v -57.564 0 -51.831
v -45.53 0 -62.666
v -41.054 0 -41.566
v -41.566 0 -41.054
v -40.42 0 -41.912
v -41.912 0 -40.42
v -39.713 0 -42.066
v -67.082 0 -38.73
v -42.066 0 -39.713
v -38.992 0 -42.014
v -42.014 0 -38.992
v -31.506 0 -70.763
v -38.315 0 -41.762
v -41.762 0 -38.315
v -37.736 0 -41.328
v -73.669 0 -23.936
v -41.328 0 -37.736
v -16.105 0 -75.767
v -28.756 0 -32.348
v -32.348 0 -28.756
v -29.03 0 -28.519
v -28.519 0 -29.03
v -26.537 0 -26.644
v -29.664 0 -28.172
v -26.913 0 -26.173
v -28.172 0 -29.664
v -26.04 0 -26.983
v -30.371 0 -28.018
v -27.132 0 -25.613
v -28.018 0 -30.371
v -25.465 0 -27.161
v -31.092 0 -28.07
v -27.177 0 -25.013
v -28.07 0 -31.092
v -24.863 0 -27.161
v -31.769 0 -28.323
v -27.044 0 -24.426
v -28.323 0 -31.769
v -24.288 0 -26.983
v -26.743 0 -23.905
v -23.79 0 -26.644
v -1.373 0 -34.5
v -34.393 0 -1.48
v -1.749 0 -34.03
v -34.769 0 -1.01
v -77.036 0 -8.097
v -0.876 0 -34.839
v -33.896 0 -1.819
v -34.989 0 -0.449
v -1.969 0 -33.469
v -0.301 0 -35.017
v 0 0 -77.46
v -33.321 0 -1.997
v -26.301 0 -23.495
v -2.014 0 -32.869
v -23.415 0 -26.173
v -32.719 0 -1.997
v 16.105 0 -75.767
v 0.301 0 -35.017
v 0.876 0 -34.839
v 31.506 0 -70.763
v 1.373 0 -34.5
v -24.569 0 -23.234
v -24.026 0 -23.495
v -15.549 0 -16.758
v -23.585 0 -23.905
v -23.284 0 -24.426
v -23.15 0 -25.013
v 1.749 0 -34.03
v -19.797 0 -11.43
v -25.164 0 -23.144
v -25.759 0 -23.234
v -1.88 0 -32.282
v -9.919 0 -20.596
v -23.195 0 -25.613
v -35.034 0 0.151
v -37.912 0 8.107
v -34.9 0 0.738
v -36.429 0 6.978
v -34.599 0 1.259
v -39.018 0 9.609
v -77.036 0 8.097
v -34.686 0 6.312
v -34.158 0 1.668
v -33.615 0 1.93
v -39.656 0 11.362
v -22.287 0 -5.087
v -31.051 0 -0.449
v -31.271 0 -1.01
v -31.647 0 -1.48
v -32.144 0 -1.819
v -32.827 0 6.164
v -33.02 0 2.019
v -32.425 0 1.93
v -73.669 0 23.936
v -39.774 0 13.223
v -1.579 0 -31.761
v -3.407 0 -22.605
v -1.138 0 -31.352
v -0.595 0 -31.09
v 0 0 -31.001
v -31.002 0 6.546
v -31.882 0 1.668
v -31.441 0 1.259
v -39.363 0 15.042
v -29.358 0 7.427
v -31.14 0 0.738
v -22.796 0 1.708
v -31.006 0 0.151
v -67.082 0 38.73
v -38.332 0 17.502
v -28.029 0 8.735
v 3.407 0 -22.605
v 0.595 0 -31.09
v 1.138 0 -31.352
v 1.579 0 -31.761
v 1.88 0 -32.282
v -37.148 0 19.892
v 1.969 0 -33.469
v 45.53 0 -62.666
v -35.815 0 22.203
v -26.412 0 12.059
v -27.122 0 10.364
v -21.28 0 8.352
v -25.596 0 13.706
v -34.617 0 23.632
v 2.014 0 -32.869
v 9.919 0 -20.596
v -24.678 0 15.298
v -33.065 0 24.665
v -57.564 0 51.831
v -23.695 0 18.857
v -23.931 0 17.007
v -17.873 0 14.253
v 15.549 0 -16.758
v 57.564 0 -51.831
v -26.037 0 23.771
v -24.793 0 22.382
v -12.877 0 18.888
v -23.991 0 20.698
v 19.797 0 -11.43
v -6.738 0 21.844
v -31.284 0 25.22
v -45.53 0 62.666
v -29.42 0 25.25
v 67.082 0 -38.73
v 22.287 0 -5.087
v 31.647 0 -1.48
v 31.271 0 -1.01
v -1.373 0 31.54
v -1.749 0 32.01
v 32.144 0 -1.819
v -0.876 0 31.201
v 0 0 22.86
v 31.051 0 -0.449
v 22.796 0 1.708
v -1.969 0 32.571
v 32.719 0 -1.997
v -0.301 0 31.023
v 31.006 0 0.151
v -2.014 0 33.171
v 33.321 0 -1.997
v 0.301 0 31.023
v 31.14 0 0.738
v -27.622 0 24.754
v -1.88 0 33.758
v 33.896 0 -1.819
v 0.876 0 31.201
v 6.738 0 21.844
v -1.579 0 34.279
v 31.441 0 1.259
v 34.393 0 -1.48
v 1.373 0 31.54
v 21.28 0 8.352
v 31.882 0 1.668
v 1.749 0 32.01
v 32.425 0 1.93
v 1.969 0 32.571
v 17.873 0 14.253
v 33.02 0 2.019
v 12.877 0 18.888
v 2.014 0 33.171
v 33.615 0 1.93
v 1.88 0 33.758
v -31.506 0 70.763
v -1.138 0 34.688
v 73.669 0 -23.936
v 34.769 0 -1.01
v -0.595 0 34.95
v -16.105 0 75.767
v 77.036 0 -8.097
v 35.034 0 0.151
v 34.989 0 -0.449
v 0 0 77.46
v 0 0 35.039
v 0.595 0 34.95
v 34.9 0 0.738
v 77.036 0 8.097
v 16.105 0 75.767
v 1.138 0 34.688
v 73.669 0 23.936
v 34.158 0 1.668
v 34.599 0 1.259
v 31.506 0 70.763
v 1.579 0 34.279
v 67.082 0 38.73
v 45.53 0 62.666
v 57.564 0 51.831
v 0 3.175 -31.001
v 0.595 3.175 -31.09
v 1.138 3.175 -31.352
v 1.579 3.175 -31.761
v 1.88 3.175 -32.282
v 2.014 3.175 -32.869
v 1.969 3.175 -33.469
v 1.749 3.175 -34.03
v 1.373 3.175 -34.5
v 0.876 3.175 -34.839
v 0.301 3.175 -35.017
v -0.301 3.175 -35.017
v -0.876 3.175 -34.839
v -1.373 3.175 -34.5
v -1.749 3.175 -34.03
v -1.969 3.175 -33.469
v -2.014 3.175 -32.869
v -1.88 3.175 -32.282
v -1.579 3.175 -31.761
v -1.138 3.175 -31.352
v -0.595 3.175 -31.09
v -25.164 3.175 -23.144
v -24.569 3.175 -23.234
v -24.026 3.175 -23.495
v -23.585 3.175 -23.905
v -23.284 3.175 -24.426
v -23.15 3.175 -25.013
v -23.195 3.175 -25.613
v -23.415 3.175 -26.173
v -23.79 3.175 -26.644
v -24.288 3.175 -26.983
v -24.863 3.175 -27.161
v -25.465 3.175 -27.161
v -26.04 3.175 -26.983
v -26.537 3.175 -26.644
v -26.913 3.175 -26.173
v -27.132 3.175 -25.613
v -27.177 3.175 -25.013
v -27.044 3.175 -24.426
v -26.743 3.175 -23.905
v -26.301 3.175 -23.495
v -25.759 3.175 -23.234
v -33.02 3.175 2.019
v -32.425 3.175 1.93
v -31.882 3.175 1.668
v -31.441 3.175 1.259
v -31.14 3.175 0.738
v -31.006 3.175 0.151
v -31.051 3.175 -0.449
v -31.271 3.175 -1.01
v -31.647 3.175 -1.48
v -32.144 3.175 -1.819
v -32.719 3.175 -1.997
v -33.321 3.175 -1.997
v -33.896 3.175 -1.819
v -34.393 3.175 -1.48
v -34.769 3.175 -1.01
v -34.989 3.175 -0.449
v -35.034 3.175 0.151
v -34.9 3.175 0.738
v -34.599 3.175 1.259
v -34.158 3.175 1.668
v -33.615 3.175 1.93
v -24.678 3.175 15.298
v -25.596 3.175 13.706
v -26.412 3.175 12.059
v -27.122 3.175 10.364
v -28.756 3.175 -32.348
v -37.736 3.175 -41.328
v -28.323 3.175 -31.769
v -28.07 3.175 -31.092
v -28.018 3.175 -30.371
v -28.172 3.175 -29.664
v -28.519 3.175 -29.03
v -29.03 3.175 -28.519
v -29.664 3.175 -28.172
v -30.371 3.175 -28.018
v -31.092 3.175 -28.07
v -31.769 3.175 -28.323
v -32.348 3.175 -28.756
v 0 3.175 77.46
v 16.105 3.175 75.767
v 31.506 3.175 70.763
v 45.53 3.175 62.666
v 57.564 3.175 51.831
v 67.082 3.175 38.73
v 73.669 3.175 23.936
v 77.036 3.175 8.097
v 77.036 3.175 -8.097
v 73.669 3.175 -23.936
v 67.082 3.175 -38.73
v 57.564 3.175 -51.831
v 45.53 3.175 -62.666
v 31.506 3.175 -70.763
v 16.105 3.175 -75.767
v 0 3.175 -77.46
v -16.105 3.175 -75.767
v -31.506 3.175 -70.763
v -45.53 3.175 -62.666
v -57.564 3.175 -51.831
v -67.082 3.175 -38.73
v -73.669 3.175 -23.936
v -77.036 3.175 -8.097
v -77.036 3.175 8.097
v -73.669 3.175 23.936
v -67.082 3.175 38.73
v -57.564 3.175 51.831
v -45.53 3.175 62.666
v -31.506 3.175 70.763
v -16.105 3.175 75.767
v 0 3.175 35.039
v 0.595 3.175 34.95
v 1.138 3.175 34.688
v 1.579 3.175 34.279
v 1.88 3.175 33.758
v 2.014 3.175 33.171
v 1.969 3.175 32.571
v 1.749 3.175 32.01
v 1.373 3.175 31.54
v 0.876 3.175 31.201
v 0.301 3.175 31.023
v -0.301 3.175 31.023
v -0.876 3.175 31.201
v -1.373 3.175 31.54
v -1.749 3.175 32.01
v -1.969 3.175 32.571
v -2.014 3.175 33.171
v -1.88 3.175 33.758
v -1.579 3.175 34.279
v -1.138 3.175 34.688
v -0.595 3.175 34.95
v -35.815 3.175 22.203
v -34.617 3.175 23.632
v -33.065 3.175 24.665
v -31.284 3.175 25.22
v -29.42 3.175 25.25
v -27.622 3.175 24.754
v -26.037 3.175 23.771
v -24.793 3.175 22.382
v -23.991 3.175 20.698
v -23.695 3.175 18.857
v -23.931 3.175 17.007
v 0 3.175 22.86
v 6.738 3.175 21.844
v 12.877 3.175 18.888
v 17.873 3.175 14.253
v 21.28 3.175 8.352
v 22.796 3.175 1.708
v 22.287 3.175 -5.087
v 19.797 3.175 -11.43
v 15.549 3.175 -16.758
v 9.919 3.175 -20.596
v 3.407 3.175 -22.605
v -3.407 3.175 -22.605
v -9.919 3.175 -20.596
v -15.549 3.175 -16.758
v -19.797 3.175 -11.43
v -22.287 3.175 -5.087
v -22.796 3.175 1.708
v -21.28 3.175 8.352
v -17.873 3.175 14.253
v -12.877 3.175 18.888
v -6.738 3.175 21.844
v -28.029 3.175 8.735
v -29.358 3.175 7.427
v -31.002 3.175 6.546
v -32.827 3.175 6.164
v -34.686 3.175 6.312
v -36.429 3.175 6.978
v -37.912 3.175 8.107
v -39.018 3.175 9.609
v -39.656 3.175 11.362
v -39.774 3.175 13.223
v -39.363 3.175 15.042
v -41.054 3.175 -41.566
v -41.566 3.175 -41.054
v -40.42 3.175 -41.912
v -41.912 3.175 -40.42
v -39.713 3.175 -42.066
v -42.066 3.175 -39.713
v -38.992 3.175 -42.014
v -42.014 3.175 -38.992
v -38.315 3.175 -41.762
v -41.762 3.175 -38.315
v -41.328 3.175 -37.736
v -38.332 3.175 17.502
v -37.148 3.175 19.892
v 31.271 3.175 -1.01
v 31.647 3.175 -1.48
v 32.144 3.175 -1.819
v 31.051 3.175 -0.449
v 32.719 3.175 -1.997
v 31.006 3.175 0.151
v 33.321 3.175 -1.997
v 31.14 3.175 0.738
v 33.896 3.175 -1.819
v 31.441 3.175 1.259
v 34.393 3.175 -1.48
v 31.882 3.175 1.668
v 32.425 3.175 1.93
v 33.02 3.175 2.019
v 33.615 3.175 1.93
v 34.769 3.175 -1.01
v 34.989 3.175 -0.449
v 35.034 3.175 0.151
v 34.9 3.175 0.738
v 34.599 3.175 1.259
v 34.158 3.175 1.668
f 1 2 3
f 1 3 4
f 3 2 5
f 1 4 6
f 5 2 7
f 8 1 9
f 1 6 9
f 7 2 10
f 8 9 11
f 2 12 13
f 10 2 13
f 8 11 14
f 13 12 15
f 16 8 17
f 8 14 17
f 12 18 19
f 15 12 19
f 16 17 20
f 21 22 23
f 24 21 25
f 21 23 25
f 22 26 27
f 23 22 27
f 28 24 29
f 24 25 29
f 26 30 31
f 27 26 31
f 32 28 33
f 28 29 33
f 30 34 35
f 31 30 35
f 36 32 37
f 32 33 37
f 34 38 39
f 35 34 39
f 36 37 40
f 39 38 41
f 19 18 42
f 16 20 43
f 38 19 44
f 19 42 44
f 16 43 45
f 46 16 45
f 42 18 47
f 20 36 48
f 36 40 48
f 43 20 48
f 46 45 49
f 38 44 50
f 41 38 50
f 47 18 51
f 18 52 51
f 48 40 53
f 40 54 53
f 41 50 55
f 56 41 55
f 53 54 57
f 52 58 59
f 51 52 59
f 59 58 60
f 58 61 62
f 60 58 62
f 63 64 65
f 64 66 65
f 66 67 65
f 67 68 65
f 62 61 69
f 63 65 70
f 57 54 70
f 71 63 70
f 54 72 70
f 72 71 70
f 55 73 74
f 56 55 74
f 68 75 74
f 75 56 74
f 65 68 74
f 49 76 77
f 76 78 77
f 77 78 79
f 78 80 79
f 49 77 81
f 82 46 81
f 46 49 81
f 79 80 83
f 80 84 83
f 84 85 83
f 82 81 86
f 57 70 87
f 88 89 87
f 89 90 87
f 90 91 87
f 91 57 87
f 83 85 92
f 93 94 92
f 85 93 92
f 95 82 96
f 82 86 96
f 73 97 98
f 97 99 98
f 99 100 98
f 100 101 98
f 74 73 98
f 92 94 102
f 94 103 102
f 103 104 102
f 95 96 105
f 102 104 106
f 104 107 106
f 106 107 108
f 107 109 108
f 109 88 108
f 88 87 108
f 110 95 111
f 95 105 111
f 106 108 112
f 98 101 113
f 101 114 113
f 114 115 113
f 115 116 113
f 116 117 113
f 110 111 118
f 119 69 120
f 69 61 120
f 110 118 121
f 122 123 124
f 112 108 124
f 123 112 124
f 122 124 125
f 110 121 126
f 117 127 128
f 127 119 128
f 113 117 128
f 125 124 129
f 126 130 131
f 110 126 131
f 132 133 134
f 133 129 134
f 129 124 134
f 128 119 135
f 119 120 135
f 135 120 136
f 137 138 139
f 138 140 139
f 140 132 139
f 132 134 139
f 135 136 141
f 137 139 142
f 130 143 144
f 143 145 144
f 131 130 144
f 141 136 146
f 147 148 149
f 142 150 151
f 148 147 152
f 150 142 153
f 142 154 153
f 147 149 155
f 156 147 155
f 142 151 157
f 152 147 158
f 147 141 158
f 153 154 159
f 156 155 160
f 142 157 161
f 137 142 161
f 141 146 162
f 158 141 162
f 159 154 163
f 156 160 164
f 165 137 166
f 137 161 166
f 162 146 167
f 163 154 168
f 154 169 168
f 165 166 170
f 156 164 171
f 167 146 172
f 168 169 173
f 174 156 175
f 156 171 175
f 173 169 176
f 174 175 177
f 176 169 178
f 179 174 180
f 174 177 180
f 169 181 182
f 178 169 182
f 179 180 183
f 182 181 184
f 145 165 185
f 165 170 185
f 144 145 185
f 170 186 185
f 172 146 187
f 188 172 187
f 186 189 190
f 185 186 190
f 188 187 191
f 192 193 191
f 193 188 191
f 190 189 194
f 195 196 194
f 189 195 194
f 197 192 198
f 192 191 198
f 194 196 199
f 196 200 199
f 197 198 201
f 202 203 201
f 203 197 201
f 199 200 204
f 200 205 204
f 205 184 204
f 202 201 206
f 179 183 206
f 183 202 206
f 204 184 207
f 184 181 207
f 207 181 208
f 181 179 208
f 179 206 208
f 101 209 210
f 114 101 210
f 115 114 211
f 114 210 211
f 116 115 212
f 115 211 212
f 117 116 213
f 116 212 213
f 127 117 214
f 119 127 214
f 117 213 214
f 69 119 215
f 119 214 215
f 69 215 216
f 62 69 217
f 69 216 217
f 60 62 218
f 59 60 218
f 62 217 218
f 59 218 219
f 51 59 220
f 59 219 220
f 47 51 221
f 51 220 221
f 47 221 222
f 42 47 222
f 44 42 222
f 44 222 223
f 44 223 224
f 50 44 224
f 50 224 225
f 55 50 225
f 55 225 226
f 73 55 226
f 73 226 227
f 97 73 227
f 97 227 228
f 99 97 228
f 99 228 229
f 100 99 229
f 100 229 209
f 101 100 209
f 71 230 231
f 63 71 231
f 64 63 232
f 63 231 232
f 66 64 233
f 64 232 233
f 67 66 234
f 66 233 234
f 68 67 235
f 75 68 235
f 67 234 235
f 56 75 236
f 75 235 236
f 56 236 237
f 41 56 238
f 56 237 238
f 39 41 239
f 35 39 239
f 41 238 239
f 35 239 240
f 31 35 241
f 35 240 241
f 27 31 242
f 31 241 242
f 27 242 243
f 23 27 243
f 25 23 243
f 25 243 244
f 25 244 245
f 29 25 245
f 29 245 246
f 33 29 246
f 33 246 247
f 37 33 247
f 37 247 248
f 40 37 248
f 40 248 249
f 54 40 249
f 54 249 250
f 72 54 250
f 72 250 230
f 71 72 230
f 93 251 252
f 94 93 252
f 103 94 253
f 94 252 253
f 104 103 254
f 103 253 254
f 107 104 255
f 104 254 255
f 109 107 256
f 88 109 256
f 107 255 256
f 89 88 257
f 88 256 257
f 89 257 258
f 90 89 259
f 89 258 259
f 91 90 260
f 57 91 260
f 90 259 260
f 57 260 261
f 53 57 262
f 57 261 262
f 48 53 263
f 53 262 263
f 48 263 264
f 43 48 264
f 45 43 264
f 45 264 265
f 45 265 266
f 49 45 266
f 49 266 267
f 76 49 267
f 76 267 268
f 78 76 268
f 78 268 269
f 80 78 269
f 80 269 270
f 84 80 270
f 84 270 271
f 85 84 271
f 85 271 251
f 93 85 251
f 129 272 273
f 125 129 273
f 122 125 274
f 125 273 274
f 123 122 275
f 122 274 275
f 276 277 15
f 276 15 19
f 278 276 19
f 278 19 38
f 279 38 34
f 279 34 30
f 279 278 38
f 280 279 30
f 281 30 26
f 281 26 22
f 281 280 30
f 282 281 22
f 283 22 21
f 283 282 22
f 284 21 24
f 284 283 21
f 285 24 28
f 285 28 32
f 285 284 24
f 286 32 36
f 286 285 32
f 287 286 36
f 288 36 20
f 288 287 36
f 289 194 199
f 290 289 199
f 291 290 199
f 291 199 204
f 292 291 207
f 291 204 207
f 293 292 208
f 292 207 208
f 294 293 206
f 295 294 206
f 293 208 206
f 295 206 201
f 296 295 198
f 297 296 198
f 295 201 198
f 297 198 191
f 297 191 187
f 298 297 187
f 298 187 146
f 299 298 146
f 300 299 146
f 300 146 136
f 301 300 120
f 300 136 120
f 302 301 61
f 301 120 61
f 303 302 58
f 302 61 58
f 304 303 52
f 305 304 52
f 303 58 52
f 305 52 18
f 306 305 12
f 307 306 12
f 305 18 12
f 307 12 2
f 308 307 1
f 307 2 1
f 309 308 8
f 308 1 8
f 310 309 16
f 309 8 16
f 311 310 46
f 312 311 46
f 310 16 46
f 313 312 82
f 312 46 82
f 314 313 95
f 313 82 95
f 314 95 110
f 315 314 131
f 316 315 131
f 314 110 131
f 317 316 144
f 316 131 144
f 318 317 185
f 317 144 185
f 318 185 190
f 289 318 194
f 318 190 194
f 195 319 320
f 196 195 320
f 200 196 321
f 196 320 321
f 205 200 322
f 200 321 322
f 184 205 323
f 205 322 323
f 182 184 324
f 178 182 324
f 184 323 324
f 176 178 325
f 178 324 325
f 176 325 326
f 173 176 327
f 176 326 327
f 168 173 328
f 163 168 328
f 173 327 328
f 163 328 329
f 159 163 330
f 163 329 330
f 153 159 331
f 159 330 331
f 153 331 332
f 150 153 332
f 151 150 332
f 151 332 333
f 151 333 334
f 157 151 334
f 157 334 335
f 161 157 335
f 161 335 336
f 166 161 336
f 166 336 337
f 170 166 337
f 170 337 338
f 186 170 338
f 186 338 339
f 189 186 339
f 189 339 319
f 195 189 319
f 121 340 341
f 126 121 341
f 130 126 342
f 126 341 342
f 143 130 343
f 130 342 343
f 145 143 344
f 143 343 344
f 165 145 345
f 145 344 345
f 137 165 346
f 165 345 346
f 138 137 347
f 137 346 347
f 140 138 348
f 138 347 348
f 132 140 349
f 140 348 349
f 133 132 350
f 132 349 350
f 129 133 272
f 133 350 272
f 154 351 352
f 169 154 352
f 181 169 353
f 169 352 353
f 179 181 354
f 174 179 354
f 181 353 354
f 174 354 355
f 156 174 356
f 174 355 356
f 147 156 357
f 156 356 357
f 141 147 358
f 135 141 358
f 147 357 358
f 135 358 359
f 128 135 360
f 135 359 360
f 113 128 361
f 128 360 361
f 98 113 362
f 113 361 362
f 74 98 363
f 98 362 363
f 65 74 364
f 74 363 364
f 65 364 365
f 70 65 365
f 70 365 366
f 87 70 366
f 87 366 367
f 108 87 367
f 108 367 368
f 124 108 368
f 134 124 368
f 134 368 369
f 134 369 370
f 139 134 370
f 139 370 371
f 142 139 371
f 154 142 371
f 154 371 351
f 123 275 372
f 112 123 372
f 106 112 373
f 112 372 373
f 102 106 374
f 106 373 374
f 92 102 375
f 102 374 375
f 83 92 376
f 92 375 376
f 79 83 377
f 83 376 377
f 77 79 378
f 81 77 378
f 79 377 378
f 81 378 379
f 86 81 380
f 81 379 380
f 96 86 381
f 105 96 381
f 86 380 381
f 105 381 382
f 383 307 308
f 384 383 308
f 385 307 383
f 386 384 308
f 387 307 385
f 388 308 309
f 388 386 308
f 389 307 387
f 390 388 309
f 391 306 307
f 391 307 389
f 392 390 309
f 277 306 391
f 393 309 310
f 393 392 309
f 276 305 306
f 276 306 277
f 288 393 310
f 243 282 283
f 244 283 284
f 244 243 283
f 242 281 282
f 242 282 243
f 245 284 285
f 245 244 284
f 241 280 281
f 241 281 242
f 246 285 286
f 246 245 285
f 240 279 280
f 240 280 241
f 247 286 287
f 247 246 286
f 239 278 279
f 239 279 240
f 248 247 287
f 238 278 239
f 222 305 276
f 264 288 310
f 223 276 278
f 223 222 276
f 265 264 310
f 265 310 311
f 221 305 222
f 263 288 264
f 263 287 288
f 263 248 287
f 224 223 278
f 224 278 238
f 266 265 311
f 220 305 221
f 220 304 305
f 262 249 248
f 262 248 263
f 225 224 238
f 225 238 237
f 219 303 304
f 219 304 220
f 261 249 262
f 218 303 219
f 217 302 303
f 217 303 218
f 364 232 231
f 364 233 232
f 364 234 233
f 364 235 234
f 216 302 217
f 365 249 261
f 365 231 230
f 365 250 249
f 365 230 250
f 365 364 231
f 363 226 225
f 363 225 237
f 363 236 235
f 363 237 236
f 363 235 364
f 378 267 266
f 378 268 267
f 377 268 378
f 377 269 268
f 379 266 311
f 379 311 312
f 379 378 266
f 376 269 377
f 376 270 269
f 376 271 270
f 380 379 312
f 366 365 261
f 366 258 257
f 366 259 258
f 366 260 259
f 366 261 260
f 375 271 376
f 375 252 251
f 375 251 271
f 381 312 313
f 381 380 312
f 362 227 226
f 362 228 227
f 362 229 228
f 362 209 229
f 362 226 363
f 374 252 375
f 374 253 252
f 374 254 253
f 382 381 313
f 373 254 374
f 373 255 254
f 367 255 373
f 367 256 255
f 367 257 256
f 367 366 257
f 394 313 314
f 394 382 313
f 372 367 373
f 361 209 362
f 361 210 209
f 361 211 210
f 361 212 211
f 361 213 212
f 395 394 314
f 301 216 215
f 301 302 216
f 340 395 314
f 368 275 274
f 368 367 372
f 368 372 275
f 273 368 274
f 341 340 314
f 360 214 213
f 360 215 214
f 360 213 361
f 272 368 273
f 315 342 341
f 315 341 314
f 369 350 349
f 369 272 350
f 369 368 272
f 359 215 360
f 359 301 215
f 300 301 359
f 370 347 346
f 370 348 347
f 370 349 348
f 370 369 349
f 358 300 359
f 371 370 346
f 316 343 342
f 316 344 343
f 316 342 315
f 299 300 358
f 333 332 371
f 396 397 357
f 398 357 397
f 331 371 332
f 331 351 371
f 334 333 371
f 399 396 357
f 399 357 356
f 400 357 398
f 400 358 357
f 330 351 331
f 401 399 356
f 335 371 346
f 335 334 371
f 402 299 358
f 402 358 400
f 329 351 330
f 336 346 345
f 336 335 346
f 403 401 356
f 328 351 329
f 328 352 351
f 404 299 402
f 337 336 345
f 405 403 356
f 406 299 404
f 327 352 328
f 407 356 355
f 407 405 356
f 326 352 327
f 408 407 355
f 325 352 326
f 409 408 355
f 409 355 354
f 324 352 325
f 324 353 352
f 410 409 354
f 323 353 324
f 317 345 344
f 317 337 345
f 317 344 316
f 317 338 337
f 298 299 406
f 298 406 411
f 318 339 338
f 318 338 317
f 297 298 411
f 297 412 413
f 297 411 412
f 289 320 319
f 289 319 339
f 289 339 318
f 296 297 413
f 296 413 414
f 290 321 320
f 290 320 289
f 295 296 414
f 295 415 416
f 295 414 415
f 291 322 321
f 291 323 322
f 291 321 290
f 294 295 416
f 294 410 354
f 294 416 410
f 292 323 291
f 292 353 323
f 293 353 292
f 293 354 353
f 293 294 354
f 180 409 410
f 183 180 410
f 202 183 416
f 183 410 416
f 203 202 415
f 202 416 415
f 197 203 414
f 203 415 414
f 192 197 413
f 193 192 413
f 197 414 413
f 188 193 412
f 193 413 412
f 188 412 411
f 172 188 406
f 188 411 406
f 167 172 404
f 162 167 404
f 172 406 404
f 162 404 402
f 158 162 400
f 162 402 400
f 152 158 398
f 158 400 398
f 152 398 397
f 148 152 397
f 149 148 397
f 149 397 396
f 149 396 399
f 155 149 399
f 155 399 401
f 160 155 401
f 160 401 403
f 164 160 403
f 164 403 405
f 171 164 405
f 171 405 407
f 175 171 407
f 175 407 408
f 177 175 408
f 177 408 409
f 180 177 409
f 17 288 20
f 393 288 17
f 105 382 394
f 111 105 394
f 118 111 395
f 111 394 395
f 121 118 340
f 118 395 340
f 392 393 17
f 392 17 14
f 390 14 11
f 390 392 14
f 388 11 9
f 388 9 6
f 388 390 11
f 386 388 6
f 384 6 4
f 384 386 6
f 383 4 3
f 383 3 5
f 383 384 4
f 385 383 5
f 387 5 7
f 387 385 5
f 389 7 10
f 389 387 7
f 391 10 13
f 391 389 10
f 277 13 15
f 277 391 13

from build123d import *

# Parameters (mm, degrees)
SKETCH1_R           = 77.4600051
BOSS_EXTRUDE1_DEPTH = 3.175
SKETCH20_R          = 22.86
SKETCH20_R_2        = 2.0193
CUT_EXTRUDE10_DEPTH = 250.596695835
CUT_EXTRUDE11_DEPTH = 3.175
SKETCH22_R          = 2.0193
CUT_EXTRUDE12_DEPTH = 250.596695835
CUT_EXTRUDE13_DEPTH = 250.596695835


with BuildPart() as part:
    # Sketch1 → Boss-Extrude1 (new body)
    with BuildSketch(Plane(origin=(0, 0, 0), x_dir=(1, 0, 0), z_dir=(0, 1, 0))):
        with Locations(Location((0, 0, 0), (0, 0, 270))):
            Circle(SKETCH1_R)
    extrude(amount=BOSS_EXTRUDE1_DEPTH)

    # Sketch20 → Cut-Extrude10 (cut, through all)
    with BuildSketch(Plane(origin=(-73.768816189, 3.175, -121.080352405), x_dir=(1, 0, 0), z_dir=(0, 1, 0))):
        with Locations(Location((73.768816189, -121.080352405, 0), (0, 0, 270))):
            Circle(SKETCH20_R)
        with Locations(Location((73.768816189, -88.060352405, 0), (0, 0, 270))):
            Circle(SKETCH20_R_2)
        with Locations(Location((106.788816189, -121.080352405, 0), (0, 0, 270))):
            Circle(SKETCH20_R_2)
        with Locations(Location((73.768816189, -154.100352405, 0), (0, 0, 270))):
            Circle(SKETCH20_R_2)
        with Locations(Location((40.748816189, -121.080352405, 0), (0, 0, 270))):
            Circle(SKETCH20_R_2)
    extrude(amount=-CUT_EXTRUDE10_DEPTH, mode=Mode.SUBTRACT)

    # Sketch21 → Cut-Extrude11 (cut)
    with BuildSketch(Plane(origin=(-73.768816189, 3.175, -121.080352405), x_dir=(1, 0, 0), z_dir=(0, 1, 0))):
        with BuildLine():
            Line((41.420818538, -92.324457203), (32.440562417, -83.344201082))
            ThreePointArc((32.440562417, -83.344201082), (32.440562417, -79.752098633), (36.032664865, -79.752098633))
            Line((36.032664865, -79.752098633), (45.012920986, -88.732354754))
            ThreePointArc((45.012920986, -88.732354754), (45.012920986, -92.324457203), (41.420818538, -92.324457203))
        make_face()
    extrude(amount=-CUT_EXTRUDE11_DEPTH, mode=Mode.SUBTRACT)

    # Sketch22 → Cut-Extrude12 (cut, through all)
    with BuildSketch(Plane(origin=(-73.768816189, 3.175, -121.080352405), x_dir=(1, 0, 0), z_dir=(0, 1, 0))):
        with Locations(Location((48.605023435, -95.916559651, 0), (0, 0, 270))):
            Circle(SKETCH22_R)
    extrude(amount=-CUT_EXTRUDE12_DEPTH, mode=Mode.SUBTRACT)

    # Sketch23 → Cut-Extrude13 (cut, through all)
    with BuildSketch(Plane(origin=(-73.768816189, 3.175, -121.080352405), x_dir=(1, 0, 0), z_dir=(0, 1, 0))):
        with BuildLine():
            ThreePointArc((34.405967979, -136.122213123), (36.00963526, -139.786919397), (37.953573181, -143.283049568))
            ThreePointArc((37.953573181, -143.283049568), (46.974494303, -145.399596657), (49.091041391, -136.378675534))
            ThreePointArc((49.091041391, -136.378675534), (47.751609959, -133.969737166), (46.646635186, -131.444644817))
            ThreePointArc((46.646635186, -131.444644817), (38.18751743, -127.663095366), (34.405967979, -136.122213123))
        make_face()
    extrude(amount=-CUT_EXTRUDE13_DEPTH, mode=Mode.SUBTRACT)


solid = part.part
